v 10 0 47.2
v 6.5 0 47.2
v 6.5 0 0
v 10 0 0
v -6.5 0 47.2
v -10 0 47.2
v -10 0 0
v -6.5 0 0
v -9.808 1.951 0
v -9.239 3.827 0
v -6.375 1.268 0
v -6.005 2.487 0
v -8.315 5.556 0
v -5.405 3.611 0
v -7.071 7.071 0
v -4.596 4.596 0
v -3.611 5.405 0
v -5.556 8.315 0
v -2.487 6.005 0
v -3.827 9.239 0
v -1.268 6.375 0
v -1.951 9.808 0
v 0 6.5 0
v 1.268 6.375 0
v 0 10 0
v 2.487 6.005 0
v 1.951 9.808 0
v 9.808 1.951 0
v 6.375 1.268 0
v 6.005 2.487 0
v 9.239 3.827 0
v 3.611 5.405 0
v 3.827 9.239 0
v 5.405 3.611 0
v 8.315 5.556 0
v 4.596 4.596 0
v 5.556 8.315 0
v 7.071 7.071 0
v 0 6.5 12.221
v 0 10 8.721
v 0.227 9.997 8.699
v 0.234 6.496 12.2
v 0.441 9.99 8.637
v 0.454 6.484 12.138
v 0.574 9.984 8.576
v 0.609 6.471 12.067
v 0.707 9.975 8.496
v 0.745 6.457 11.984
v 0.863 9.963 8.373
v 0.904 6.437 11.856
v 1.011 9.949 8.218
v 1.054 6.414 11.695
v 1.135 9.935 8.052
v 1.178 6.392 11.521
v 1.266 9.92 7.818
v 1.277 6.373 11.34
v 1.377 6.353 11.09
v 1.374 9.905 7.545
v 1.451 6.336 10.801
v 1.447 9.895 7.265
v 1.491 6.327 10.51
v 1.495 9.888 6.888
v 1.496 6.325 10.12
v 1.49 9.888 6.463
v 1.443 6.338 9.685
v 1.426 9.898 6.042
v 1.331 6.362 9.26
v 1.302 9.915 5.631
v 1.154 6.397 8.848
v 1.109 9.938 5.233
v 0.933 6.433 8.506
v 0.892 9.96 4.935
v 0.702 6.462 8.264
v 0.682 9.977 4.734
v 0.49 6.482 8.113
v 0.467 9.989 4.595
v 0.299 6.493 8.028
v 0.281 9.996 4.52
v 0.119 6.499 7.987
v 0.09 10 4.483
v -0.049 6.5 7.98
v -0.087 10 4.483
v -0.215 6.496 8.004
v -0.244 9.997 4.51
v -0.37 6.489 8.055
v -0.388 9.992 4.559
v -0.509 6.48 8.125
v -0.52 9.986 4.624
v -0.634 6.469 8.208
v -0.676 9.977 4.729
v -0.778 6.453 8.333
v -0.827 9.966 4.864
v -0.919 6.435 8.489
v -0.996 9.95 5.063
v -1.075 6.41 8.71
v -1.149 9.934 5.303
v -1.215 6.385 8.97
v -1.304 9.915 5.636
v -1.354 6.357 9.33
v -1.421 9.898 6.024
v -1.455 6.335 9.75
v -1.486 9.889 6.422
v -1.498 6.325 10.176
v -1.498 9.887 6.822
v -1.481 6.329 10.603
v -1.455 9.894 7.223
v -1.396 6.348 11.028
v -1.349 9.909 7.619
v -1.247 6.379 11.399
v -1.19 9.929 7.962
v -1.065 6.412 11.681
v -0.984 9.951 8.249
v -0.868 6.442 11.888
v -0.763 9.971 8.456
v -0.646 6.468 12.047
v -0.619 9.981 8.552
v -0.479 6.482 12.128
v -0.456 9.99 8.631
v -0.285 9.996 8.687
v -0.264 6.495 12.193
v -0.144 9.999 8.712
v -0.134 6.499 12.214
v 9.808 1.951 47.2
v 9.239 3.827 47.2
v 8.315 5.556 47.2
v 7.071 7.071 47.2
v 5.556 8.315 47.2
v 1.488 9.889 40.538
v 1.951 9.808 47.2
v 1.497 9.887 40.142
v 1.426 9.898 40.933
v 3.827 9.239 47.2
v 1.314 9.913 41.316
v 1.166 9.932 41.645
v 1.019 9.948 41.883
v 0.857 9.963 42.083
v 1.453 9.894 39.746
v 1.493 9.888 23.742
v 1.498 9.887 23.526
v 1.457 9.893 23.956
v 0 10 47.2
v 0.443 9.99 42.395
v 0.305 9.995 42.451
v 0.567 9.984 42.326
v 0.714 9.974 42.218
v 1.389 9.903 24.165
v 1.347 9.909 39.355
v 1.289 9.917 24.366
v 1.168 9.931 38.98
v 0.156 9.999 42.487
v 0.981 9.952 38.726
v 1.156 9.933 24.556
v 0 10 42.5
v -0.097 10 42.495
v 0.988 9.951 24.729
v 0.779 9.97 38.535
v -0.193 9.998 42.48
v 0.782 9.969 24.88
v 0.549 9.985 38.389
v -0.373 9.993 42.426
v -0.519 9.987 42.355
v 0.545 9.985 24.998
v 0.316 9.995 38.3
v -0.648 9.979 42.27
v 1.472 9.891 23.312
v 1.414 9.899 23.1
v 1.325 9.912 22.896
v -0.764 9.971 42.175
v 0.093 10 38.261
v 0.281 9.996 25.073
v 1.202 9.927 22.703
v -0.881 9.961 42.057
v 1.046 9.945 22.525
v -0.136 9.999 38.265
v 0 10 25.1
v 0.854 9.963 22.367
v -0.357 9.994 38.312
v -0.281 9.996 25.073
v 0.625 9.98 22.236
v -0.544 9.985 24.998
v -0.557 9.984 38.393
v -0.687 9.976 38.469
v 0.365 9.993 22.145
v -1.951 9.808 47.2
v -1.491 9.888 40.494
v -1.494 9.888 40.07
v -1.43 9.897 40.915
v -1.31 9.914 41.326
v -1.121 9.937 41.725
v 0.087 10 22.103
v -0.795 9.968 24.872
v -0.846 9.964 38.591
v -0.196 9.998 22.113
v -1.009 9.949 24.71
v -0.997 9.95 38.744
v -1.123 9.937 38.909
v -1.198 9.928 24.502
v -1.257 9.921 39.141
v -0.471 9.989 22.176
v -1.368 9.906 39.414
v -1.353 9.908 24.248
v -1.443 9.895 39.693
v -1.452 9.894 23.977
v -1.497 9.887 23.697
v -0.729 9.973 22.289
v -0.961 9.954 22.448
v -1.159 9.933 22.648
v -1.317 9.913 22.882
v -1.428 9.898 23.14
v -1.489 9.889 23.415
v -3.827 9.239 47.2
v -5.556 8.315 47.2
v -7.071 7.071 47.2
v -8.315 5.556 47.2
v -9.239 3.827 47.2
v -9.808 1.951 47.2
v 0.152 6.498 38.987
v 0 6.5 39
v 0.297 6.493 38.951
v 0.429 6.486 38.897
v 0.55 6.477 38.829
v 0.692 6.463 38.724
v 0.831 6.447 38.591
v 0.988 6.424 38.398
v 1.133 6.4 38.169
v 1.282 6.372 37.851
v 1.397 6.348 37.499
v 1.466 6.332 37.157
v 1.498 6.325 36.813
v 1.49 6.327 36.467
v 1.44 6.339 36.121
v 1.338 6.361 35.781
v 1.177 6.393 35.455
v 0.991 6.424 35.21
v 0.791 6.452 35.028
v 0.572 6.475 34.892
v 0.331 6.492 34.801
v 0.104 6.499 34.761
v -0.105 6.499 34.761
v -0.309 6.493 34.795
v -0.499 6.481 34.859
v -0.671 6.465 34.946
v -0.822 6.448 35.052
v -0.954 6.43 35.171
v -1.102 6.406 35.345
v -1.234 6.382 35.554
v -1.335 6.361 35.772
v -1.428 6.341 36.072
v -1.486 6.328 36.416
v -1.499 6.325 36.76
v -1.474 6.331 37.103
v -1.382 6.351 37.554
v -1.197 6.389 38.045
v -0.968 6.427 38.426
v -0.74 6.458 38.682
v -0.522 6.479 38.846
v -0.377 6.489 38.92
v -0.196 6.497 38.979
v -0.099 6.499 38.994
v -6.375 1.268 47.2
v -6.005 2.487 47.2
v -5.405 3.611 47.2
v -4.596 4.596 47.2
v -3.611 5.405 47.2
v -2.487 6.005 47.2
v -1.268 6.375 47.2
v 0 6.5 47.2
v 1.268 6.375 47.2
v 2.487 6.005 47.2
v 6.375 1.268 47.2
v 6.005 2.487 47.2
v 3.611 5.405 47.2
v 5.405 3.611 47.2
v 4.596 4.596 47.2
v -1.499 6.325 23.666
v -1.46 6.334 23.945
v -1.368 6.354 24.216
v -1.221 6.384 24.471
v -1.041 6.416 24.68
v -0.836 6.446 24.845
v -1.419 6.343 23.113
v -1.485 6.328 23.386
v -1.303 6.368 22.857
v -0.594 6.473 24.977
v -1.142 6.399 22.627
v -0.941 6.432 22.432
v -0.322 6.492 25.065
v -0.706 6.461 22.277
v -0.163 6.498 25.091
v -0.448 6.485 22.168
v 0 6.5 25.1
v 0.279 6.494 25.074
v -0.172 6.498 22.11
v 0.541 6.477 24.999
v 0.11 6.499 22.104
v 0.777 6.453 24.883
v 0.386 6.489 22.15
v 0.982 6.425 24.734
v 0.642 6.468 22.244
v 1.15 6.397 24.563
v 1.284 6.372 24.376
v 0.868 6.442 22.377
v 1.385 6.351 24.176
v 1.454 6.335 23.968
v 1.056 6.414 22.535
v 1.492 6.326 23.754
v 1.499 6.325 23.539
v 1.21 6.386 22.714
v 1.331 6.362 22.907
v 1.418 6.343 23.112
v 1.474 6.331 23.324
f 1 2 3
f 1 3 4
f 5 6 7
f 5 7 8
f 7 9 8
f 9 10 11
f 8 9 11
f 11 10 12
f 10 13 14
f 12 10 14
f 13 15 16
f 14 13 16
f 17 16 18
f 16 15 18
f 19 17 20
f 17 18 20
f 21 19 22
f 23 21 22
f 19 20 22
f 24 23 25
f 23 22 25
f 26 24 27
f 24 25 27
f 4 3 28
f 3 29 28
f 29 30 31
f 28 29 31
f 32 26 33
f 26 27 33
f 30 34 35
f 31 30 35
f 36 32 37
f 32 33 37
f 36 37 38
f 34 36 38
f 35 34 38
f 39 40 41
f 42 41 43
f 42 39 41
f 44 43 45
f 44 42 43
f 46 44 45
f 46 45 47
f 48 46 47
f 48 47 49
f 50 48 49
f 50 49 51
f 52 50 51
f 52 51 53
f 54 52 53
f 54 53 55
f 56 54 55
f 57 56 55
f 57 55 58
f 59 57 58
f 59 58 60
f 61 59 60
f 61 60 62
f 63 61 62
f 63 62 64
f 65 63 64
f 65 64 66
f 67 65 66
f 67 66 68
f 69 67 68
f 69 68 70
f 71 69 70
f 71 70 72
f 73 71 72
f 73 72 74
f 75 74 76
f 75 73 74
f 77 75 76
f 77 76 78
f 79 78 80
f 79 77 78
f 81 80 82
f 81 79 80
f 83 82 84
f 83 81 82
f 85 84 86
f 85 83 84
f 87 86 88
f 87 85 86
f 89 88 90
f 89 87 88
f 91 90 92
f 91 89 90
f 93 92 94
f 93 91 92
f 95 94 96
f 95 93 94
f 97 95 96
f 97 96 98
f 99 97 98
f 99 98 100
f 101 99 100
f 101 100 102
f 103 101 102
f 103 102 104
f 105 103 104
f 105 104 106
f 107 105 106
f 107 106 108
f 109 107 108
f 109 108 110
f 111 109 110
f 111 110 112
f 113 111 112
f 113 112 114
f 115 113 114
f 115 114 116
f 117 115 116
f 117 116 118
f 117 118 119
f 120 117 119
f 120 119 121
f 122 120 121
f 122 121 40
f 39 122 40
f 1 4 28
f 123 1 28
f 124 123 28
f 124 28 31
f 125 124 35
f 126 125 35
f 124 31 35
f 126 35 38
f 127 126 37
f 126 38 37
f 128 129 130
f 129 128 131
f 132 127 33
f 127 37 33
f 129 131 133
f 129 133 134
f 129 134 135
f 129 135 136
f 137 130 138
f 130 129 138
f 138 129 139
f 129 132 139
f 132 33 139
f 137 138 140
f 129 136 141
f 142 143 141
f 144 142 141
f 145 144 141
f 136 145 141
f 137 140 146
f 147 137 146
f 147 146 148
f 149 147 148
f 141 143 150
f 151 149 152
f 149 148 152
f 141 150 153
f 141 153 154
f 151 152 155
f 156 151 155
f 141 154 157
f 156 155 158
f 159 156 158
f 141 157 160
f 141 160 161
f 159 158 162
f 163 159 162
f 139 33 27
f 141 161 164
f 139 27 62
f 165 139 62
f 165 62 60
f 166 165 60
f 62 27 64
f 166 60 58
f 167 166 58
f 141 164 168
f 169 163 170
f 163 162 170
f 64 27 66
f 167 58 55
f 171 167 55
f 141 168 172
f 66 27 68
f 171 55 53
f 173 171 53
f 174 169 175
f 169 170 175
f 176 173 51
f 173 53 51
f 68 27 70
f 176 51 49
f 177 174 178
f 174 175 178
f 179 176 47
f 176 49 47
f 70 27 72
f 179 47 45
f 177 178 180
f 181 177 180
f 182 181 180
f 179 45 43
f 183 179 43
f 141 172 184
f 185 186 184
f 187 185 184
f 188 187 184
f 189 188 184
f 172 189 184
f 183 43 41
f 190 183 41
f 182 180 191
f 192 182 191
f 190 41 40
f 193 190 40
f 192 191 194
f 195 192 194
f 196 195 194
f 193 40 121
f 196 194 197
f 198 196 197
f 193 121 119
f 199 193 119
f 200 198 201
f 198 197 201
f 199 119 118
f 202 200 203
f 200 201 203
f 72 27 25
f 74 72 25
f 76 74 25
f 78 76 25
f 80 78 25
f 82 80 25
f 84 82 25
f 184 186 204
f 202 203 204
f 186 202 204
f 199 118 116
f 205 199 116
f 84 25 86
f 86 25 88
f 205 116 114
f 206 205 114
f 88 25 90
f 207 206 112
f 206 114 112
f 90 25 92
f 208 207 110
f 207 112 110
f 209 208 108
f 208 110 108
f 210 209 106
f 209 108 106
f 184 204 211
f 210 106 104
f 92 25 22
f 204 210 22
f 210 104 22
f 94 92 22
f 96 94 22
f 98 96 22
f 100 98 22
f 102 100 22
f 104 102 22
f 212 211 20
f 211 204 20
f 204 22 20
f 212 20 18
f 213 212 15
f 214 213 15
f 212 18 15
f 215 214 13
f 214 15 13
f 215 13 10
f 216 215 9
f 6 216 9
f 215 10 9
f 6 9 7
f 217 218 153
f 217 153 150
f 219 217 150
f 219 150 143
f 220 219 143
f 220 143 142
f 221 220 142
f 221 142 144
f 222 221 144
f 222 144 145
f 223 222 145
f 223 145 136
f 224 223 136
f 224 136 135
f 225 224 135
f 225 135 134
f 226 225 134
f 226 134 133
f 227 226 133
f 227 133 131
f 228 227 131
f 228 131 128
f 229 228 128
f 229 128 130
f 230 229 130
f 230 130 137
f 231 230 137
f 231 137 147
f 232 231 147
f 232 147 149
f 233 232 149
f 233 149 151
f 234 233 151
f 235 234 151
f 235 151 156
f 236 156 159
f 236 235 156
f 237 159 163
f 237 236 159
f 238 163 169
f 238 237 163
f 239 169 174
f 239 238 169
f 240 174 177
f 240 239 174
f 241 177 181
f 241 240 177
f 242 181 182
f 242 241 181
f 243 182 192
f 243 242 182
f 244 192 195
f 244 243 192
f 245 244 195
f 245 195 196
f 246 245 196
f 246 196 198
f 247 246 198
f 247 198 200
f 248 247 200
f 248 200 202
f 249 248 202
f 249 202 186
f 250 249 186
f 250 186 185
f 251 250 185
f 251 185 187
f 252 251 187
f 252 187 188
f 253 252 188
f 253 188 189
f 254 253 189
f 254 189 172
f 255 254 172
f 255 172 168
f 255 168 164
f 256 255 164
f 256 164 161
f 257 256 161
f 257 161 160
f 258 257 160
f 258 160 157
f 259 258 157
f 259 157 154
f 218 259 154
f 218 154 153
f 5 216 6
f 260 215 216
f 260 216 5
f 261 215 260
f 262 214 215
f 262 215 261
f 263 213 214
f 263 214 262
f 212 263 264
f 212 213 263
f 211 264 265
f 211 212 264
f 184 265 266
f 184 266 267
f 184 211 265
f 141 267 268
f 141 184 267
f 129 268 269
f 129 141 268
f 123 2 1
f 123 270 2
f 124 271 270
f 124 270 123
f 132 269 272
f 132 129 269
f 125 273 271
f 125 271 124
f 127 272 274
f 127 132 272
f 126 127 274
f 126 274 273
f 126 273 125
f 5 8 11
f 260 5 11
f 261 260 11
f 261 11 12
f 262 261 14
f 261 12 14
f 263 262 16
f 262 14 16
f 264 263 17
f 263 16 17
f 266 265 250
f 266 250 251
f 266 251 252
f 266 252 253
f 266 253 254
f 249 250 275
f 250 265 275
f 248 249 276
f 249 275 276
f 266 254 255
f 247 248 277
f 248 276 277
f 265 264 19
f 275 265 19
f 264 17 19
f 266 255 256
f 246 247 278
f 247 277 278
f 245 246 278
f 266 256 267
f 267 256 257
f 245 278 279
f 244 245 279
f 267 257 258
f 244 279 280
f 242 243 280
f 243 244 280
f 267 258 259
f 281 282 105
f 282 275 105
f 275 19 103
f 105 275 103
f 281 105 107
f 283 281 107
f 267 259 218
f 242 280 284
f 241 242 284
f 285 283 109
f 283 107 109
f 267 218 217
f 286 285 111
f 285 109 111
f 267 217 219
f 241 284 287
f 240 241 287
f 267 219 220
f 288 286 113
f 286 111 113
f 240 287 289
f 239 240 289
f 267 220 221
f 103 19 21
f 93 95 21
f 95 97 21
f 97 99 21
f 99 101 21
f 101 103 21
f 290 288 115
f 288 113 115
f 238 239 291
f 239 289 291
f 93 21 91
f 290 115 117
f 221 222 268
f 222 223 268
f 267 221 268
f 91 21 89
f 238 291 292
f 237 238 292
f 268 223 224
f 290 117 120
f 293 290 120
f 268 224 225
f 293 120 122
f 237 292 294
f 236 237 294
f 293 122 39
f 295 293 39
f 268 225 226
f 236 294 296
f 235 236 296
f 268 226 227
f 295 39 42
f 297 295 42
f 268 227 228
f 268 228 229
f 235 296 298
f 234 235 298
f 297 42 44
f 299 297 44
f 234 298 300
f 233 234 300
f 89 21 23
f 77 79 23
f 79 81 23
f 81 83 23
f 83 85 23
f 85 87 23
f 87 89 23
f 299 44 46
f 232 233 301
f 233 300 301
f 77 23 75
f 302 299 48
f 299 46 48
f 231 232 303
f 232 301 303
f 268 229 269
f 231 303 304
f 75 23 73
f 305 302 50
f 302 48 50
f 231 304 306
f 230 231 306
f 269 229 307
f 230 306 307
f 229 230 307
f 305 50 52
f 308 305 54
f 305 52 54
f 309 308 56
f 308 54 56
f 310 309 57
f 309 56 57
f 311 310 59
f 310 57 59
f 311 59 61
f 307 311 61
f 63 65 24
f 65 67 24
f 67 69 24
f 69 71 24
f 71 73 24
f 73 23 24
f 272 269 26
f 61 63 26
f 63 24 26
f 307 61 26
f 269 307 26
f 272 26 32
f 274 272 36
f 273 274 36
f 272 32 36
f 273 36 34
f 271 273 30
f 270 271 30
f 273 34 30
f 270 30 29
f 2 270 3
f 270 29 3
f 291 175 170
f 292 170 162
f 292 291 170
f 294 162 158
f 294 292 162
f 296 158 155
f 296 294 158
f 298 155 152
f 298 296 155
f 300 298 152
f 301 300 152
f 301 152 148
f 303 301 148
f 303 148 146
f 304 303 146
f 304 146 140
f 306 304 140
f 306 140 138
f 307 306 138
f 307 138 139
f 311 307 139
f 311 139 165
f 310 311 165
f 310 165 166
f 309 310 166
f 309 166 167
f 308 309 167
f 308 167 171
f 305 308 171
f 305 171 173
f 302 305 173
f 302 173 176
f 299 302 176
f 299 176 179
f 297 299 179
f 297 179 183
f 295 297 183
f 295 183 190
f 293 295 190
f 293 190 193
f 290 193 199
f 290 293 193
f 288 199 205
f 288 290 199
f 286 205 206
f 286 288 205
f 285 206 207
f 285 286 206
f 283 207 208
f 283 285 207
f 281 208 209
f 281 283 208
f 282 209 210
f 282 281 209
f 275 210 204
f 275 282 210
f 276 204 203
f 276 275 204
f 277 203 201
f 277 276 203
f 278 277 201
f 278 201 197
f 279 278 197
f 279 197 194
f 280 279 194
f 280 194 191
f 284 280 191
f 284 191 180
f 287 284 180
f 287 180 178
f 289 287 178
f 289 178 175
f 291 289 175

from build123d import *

# Parameters (mm, degrees)
BOSS_EXTRUDE1_DEPTH     = 47.2
CUT_EXTRUDE1_DEPTH      = 50.273116402
CUT_EXTRUDE1_DEPTH_BACK = 50.273116402
SKETCH3_R               = 1.5
CUT_EXTRUDE3_DEPTH      = 51.597430898
CUT_EXTRUDE3_DEPTH_BACK = 51.597430898
SKETCH7_R               = 1.5
CUT_EXTRUDE4_DEPTH      = 37.999869057
CUT_EXTRUDE4_DEPTH_BACK = 37.999869057
SKETCH10_R              = 1.5


with BuildPart() as part:
    # Sketch1 → Boss-Extrude1 (new body)
    with BuildSketch(Plane.XY):
        with BuildLine():
            Line((6.5, 0), (10, 0))
            ThreePointArc((10, 0), (0, 10), (-10, 0))
            Line((-10, 0), (-6.5, 0))
            ThreePointArc((-6.5, 0), (0, 6.5), (6.5, 0))
        make_face()
    extrude(amount=BOSS_EXTRUDE1_DEPTH)

    # Sketch3 → Cut-Extrude1 (cut, two sides: drawn at the far end of the back side and taken through both)
    with BuildSketch(Plane(origin=(0, 0, 0), x_dir=(1, 0, 0), z_dir=(0, 1, 0)).offset(-CUT_EXTRUDE1_DEPTH_BACK)):
        with Locations(Location((0, -23.6, 0), (0, 0, 270))):
            Circle(SKETCH3_R)
    extrude(amount=CUT_EXTRUDE1_DEPTH + CUT_EXTRUDE1_DEPTH_BACK, mode=Mode.SUBTRACT)

    # Sketch7 → Cut-Extrude3 (cut, two sides: drawn at the far end of the back side and taken through both)
    with BuildSketch(Plane(origin=(0, 1.7, -1.7), x_dir=(0, 0.7071067811865389, 0.7071067811865561), z_dir=(0, 0.7071067811865561, -0.7071067811865389)).offset(-CUT_EXTRUDE3_DEPTH_BACK)):
        with Locations((11.737972568, 0)):
            Circle(SKETCH7_R)
    extrude(amount=CUT_EXTRUDE3_DEPTH + CUT_EXTRUDE3_DEPTH_BACK, mode=Mode.SUBTRACT)

    # Sketch10 → Cut-Extrude4 (cut, two sides: drawn at the far end of the back side and taken through both)
    with BuildSketch(Plane(origin=(0, 25.189187146, 25.189187146), x_dir=(0, -0.7071067811865488, 0.7071067811865464), z_dir=(0, 0.7071067811865464, 0.7071067811865488)).offset(-CUT_EXTRUDE4_DEPTH_BACK)):
        with Locations((21.480754463, 0)):
            Circle(SKETCH10_R)
    extrude(amount=CUT_EXTRUDE4_DEPTH + CUT_EXTRUDE4_DEPTH_BACK, mode=Mode.SUBTRACT)


solid = part.part
